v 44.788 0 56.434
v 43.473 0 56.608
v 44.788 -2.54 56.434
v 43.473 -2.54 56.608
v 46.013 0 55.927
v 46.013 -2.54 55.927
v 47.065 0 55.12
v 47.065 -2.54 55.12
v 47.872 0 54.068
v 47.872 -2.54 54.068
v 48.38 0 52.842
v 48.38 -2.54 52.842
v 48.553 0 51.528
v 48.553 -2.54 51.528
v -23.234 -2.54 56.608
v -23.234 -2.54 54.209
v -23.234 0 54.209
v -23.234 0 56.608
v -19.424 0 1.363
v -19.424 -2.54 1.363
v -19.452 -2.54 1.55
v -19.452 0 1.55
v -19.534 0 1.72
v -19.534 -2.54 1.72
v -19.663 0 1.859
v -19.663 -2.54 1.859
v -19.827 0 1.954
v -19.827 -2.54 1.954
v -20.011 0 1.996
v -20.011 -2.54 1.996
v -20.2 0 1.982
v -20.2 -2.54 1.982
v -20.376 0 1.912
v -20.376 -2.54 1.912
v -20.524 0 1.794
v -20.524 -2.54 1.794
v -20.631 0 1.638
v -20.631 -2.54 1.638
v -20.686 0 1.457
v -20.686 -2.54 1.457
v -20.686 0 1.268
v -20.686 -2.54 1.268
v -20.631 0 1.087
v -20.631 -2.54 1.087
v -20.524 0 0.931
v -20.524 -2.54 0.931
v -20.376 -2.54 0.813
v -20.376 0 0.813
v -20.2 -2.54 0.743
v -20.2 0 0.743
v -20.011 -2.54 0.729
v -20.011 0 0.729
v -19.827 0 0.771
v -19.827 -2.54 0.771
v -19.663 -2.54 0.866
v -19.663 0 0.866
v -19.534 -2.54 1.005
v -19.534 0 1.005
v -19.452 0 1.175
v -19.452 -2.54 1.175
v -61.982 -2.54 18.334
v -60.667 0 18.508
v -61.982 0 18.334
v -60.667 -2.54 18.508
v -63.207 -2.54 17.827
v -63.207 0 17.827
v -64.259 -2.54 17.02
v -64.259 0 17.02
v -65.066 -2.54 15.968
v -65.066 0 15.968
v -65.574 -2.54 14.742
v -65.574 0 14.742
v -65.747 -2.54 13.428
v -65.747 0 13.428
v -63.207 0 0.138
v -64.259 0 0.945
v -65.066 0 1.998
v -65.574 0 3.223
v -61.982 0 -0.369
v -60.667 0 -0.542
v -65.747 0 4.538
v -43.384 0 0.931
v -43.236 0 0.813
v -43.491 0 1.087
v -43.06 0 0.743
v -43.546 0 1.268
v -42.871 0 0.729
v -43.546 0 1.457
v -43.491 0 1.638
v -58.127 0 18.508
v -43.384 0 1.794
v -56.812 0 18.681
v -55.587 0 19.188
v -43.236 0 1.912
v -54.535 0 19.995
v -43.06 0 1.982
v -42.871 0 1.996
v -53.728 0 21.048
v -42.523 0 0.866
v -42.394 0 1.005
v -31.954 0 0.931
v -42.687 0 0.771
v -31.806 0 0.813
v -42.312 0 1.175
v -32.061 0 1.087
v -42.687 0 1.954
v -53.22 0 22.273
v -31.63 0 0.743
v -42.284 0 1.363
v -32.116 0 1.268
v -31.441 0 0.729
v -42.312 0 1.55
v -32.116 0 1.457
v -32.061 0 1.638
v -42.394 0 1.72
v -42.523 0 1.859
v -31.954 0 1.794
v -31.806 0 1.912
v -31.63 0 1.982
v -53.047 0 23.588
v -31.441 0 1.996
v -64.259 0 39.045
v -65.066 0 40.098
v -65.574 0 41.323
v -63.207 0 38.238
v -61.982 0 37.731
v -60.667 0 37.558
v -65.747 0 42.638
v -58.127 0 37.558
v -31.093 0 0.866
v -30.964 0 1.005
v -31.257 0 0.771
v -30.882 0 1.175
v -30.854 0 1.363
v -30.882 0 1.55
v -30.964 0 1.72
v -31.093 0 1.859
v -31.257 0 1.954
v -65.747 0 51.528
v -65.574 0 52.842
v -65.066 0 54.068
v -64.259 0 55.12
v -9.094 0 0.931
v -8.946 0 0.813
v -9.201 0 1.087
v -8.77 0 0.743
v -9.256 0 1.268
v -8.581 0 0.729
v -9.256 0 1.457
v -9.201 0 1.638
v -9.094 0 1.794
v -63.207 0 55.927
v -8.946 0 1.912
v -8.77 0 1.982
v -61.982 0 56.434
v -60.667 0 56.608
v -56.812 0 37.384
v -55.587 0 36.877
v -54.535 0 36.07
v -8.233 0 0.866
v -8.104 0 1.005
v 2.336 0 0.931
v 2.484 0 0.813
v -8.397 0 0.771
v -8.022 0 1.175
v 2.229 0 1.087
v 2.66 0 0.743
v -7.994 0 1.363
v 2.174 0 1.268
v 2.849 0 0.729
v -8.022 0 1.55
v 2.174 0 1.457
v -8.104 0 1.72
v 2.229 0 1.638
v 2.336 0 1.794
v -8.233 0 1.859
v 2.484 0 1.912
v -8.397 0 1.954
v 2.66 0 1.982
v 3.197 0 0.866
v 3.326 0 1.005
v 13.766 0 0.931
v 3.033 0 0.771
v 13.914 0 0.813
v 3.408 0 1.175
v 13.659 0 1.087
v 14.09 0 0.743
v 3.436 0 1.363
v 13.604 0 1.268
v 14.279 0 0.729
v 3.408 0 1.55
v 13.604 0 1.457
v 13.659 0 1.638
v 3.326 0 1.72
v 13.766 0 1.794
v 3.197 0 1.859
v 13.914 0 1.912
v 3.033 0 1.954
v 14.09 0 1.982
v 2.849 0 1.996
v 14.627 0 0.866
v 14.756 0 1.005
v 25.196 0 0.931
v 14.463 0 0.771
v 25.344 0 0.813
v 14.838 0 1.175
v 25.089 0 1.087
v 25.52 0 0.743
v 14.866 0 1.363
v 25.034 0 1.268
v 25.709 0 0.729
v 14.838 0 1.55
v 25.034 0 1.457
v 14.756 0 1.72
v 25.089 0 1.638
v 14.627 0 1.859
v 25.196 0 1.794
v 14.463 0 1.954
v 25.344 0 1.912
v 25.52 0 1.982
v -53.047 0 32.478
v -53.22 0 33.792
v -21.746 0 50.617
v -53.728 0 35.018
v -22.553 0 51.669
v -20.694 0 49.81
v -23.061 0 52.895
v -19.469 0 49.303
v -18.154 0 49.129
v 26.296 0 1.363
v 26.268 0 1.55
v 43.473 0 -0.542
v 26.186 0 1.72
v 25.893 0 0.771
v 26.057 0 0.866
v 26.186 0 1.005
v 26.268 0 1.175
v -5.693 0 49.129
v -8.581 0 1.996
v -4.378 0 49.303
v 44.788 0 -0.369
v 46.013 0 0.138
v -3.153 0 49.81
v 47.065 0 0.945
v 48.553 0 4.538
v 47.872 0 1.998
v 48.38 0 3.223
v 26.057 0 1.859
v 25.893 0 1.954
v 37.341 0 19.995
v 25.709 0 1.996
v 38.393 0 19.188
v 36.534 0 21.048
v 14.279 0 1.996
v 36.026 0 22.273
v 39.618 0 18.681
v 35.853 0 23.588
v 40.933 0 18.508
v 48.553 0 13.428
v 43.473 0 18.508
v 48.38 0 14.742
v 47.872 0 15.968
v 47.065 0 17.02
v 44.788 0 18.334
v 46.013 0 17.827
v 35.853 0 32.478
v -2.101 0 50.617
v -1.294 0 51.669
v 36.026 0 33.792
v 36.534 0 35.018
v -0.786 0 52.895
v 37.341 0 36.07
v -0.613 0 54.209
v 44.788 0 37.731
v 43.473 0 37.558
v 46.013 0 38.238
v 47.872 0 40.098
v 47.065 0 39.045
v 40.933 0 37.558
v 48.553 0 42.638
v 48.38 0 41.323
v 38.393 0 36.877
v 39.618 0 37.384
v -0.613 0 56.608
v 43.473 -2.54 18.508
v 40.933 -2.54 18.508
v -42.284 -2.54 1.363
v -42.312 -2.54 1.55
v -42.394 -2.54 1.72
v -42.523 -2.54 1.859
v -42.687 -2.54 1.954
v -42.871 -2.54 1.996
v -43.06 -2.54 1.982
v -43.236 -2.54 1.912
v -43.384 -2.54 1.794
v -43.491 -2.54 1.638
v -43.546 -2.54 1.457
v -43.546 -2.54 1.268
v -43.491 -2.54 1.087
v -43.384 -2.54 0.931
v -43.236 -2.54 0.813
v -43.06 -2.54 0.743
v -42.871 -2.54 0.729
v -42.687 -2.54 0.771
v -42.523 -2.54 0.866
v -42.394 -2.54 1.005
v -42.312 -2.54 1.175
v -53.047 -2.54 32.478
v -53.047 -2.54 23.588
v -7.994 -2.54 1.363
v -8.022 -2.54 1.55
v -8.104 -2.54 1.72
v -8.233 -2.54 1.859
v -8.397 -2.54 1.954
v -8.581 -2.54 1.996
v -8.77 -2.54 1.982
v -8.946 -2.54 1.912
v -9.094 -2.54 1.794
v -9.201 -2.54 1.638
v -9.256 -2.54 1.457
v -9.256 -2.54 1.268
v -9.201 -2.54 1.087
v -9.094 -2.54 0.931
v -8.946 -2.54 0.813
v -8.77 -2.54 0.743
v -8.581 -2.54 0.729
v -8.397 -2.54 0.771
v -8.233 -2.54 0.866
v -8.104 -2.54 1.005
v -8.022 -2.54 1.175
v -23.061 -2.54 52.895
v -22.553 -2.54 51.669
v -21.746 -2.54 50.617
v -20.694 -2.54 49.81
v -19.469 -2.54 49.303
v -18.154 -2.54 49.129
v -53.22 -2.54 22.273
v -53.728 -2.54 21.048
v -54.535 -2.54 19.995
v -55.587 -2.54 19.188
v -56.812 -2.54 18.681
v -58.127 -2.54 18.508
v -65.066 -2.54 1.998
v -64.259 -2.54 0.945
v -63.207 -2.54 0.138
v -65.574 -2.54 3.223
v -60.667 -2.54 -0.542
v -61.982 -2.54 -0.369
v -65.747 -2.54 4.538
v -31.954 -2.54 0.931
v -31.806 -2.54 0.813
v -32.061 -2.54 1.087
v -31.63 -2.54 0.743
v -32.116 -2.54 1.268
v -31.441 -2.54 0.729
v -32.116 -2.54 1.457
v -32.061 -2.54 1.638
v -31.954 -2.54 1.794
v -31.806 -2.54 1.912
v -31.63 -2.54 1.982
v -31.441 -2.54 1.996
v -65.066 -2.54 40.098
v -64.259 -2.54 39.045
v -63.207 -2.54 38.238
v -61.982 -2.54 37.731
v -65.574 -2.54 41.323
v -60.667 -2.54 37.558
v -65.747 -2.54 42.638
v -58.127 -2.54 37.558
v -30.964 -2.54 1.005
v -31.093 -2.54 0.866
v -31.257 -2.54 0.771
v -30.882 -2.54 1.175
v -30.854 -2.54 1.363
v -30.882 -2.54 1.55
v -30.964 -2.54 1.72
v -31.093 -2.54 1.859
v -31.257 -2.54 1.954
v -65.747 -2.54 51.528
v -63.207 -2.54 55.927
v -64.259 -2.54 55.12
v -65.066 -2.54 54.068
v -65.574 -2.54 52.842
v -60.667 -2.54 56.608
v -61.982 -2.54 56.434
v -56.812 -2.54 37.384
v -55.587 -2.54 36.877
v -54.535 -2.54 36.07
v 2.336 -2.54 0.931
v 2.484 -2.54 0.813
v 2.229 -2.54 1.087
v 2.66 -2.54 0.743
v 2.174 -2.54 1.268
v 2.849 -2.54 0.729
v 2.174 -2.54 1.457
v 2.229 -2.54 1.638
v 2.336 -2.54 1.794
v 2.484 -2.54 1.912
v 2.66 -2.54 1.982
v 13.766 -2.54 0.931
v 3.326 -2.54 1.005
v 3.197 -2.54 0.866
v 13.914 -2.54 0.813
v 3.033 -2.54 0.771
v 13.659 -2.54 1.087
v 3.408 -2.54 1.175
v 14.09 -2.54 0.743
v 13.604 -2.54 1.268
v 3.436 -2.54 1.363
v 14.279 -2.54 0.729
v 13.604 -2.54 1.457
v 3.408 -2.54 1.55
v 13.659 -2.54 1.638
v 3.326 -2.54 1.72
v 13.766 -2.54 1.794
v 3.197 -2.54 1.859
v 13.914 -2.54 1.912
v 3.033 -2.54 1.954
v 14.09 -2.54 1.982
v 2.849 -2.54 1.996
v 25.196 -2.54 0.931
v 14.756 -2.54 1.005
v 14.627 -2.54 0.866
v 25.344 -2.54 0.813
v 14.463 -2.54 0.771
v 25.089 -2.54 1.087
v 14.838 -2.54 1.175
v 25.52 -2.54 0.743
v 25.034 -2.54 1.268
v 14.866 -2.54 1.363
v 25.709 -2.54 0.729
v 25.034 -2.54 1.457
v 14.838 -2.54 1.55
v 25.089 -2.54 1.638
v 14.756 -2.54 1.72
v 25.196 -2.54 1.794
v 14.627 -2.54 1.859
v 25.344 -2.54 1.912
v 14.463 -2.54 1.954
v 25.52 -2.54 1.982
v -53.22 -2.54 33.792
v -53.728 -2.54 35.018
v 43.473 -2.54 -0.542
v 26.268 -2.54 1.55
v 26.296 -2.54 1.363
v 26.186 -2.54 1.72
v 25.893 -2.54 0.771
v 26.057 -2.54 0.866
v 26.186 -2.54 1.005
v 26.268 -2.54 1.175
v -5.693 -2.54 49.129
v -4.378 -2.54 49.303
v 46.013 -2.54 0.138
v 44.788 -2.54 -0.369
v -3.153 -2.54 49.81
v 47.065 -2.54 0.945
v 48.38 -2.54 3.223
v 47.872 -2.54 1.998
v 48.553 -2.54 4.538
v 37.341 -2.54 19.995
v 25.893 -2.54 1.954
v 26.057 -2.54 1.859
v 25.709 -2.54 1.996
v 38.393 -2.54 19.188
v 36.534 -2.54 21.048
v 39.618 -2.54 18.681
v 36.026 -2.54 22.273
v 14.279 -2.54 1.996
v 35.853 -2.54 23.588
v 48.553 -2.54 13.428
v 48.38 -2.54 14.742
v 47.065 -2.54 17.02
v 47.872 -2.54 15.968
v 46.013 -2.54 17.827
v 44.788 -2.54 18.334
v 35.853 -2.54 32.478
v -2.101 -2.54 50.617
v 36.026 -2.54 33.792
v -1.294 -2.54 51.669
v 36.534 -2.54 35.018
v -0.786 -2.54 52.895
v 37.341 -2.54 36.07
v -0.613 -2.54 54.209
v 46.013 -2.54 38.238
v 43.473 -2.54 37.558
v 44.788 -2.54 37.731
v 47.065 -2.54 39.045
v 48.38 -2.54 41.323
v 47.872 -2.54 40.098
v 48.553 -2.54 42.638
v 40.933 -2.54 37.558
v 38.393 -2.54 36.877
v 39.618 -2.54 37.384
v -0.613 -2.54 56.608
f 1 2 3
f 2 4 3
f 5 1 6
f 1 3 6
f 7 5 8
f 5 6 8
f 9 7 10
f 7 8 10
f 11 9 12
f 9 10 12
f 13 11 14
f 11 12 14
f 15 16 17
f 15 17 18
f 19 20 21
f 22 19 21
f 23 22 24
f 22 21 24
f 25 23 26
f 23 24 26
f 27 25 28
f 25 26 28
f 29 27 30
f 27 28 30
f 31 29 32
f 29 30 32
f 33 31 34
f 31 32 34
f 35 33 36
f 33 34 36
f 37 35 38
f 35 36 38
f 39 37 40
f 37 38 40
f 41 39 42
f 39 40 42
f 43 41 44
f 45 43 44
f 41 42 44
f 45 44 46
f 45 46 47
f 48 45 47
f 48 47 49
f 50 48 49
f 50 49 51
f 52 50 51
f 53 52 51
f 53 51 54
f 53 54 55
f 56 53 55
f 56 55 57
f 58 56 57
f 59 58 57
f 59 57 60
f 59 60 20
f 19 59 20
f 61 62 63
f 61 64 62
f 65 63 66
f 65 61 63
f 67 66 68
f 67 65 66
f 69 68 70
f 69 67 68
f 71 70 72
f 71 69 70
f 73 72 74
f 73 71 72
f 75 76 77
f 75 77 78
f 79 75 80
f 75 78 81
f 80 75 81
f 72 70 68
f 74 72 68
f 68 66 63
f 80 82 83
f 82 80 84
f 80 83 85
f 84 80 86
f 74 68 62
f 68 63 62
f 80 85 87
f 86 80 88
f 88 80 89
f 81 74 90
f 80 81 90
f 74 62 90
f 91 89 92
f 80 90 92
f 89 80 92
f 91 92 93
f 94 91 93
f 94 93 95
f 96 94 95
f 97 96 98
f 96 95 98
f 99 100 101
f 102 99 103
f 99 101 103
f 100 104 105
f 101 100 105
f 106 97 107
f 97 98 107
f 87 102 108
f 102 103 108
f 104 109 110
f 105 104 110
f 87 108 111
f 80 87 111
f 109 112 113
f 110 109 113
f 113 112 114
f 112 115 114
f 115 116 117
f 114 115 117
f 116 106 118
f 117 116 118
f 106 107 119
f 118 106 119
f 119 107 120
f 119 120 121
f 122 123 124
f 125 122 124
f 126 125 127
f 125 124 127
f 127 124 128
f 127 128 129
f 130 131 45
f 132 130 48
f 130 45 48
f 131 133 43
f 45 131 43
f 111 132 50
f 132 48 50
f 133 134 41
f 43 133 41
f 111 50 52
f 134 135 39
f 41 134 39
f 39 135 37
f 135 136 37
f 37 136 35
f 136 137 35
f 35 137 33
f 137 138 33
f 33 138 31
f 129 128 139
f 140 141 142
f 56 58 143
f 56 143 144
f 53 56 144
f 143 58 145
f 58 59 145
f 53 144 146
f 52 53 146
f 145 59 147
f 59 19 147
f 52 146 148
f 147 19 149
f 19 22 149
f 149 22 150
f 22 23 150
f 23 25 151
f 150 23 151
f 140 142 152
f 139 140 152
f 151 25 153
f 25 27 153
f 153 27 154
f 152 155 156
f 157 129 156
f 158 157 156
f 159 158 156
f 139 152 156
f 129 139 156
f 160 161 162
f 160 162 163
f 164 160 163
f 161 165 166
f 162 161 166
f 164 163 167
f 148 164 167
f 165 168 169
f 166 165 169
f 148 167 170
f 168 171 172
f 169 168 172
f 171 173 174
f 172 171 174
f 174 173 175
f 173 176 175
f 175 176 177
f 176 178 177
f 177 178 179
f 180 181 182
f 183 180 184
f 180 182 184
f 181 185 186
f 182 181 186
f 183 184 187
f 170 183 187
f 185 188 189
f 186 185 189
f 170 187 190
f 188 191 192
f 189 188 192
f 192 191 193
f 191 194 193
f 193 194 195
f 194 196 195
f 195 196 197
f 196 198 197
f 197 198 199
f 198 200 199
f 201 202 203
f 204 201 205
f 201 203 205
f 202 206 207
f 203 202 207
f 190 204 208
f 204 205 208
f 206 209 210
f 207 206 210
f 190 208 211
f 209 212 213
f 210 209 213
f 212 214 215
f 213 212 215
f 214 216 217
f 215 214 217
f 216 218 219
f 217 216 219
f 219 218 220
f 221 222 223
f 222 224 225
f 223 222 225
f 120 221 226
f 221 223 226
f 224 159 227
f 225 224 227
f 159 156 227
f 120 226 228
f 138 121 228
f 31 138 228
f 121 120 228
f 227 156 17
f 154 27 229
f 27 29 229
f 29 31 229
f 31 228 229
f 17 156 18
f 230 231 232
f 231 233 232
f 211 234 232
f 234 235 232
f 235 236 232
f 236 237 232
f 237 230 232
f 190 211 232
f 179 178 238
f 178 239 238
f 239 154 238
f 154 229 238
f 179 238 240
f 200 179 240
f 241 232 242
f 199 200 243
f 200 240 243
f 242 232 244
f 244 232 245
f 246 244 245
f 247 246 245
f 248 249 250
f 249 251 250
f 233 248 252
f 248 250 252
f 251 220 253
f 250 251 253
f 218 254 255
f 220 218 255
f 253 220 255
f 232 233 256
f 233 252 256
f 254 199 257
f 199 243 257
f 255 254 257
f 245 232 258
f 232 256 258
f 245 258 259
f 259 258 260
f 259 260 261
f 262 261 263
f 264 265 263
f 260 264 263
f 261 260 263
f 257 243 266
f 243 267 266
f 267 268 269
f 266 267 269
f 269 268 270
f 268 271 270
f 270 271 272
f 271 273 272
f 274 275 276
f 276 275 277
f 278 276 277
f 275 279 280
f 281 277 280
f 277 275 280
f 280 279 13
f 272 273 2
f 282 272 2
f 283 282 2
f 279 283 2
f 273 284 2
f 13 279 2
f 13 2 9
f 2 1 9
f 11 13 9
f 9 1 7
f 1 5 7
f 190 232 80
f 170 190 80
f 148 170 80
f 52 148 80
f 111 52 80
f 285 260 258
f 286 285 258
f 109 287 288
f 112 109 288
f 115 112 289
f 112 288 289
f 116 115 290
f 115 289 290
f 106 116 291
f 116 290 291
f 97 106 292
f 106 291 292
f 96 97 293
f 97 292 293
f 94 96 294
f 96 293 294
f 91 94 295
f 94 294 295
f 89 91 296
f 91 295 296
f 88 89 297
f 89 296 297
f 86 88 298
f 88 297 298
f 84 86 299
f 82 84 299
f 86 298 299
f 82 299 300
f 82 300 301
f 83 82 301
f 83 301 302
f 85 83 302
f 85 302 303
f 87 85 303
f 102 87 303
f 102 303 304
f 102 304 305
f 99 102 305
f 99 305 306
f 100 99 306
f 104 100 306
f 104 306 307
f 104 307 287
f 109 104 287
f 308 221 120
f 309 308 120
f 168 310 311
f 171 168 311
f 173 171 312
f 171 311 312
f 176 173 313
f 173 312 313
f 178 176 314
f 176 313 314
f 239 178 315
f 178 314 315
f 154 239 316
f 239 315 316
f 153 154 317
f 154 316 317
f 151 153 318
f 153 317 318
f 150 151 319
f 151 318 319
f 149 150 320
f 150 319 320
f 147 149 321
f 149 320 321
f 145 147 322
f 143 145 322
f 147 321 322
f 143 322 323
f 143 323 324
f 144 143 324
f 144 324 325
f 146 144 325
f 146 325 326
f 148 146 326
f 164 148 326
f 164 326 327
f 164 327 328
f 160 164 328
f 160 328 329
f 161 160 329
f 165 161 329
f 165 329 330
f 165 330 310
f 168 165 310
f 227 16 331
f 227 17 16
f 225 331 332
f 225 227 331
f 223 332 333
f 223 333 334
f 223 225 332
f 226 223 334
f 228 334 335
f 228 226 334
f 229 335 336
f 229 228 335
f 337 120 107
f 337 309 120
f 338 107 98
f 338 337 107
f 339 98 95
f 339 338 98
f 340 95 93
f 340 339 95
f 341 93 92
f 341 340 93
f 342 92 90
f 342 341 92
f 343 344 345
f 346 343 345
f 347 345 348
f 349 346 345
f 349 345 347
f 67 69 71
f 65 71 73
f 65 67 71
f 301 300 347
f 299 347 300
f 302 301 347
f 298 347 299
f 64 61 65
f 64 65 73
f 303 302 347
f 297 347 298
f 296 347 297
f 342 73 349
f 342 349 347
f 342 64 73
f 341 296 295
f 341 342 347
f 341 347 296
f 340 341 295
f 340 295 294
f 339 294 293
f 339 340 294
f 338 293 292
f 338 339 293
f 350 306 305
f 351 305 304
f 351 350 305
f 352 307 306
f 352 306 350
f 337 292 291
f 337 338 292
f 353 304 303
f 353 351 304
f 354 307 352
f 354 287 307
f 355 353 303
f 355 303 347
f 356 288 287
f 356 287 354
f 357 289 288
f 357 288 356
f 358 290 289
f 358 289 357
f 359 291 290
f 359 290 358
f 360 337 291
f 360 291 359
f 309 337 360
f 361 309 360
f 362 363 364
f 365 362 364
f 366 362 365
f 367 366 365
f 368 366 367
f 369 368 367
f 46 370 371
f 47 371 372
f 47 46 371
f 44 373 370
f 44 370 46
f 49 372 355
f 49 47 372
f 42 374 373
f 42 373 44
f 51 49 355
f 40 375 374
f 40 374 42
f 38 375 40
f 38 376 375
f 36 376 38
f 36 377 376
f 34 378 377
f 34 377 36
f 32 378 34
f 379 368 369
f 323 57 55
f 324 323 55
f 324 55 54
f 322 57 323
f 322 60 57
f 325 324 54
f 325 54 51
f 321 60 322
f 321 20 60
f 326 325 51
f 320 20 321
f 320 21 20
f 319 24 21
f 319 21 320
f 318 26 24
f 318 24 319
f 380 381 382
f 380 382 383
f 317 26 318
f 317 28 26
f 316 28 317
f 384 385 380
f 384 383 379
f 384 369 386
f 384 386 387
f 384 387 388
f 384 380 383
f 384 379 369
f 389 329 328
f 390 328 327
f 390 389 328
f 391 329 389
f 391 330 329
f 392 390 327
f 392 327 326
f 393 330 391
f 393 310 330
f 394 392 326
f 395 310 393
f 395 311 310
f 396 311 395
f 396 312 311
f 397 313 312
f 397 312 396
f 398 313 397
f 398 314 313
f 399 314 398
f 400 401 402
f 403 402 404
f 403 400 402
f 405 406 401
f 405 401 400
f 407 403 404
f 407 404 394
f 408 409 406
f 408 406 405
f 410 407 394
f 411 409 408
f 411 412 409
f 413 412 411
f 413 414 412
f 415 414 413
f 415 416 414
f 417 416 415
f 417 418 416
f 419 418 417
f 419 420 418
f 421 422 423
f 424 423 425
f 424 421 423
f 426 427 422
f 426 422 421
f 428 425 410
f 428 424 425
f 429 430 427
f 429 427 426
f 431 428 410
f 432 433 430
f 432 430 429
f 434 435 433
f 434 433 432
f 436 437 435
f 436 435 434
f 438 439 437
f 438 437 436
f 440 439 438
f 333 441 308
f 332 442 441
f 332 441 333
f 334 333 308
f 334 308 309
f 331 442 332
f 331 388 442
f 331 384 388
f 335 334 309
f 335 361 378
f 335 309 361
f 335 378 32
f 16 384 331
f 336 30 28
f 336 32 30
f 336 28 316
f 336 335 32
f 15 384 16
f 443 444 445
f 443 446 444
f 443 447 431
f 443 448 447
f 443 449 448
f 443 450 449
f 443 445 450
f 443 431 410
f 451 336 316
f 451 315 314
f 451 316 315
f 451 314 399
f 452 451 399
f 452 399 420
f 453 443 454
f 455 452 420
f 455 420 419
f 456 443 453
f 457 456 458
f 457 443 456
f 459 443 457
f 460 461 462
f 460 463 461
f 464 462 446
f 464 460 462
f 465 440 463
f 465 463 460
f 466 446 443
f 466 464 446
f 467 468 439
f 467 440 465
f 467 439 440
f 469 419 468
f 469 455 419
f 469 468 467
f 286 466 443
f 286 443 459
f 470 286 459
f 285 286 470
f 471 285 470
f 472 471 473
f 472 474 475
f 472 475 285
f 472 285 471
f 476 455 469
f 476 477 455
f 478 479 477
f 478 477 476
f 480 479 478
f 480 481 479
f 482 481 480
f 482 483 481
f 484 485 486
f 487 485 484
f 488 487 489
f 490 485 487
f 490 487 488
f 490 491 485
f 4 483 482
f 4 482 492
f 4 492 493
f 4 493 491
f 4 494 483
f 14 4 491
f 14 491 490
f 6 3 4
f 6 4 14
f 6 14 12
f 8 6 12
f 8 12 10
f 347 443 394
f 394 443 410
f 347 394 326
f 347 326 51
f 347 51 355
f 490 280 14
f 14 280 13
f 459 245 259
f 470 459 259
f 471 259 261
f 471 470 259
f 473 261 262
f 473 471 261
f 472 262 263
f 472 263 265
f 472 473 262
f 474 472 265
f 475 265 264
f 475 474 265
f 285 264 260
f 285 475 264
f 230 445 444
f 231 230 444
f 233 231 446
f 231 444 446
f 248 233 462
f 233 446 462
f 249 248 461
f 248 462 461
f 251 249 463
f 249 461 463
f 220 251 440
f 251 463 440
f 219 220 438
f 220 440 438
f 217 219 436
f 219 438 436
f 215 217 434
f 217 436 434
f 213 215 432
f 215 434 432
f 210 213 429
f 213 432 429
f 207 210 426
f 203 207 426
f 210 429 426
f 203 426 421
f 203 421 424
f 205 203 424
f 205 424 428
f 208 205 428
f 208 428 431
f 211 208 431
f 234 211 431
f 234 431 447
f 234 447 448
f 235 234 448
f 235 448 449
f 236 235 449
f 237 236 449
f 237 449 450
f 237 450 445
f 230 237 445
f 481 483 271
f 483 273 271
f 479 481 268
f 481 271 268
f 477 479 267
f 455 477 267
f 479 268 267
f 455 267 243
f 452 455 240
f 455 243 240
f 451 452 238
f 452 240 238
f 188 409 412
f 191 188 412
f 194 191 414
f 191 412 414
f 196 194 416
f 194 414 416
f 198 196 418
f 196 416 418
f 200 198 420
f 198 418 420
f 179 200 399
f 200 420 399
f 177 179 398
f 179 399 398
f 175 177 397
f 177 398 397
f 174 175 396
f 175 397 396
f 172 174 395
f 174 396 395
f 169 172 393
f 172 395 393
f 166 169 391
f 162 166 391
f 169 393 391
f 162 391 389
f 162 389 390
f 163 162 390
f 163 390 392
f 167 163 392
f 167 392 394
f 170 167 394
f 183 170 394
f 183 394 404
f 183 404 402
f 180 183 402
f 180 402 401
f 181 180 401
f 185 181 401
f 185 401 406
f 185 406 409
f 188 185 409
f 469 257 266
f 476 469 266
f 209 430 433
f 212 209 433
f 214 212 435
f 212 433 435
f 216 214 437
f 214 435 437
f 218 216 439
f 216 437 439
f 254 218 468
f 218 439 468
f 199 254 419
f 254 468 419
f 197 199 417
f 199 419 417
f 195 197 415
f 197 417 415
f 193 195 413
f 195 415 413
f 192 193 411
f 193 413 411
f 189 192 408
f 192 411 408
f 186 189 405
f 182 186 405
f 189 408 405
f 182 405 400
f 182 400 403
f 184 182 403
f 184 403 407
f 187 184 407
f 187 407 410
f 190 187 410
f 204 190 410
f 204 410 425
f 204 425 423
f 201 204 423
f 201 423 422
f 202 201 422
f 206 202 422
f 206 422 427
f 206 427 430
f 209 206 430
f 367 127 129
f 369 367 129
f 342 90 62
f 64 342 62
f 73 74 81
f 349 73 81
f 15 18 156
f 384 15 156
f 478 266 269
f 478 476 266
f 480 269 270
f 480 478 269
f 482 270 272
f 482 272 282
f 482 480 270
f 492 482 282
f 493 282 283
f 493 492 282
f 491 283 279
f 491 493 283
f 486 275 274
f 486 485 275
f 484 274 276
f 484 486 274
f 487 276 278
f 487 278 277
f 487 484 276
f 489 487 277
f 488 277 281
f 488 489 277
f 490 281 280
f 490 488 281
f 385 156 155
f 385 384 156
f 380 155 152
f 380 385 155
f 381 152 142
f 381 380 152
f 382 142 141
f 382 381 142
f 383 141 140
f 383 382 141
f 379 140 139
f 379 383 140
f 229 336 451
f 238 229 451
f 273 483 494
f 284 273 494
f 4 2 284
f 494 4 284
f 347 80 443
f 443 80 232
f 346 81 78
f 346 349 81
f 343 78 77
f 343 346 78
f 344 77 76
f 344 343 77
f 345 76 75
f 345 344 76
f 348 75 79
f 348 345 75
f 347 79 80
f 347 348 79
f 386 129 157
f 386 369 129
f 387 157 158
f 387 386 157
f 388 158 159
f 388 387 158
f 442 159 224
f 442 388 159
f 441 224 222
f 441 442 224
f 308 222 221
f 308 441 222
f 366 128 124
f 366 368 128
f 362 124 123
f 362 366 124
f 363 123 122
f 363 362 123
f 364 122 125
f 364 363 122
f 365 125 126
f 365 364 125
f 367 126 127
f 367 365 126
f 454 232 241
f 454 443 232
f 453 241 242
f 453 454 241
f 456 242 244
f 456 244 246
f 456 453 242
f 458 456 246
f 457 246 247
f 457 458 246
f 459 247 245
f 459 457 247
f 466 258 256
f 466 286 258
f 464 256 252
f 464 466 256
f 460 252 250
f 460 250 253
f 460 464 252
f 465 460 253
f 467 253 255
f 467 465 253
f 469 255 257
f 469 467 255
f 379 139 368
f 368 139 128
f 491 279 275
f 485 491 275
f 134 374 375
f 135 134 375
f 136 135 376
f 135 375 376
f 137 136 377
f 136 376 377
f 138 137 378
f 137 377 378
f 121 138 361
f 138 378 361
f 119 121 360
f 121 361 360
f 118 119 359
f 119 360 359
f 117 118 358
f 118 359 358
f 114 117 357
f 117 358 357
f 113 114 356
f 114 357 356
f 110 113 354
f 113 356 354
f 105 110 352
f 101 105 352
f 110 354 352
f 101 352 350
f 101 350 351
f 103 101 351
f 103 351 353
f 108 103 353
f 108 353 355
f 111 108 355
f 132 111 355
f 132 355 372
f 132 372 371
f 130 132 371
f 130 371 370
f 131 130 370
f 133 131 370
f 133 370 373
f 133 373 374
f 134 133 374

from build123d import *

# Parameters (mm, degrees)
F1_DEPTH = 2.54
F2_R     = 5.08
F3_R     = 0.635
F4_DEPTH = 25.4
F5_W     = 22.621028
F5_H     = 7.478164
F6_DEPTH = 25.4
F7_R     = 5.08


with BuildPart() as f1:
    # F0 (on Front) → F1 (new body)
    with BuildSketch(Plane.XZ):
        Polygon((48.55294, 56.607572), (-65.74706, 56.607572), (-65.74706, 37.557572), (-53.04706, 37.557572), (-53.04706, 18.507572), (-65.74706, 18.507572), (-65.74706, -0.542428), (48.55294, -0.542428), (48.55294, 18.507572), (35.85294, 18.507572), (35.85294, 37.557572), (48.55294, 37.557572), align=None)
    extrude(amount=F1_DEPTH)

    # F2
    f2_edges = [f1.edges().sort_by_distance(p)[0] for p in [
        (-65.74706, -1.27, 56.607572),
        (-65.74706, -1.27, 37.557572),
        (-53.04706, -1.27, 37.557572),
        (-53.04706, -1.27, 18.507572),
        (-65.74706, -1.27, 18.507572),
        (-65.74706, -1.27, -0.542428),
        (48.55294, -1.27, -0.542428),
        (35.85294, -1.27, 18.507572),
        (48.55294, -1.27, 18.507572),
        (35.85294, -1.27, 37.557572),
        (48.55294, -1.27, 37.557572),
        (48.55294, -1.27, 56.607572),
    ]]
    fillet(f2_edges, radius=F2_R)

    # F3 (on face) → F4 (cut)
    with BuildSketch(Plane.XZ.offset(2.54)):
        with Locations((-42.918559, 1.362572)):
            Circle(F3_R)
        with Locations((-31.488559, 1.362572)):
            Circle(F3_R)
        with Locations((-20.058559, 1.362572)):
            Circle(F3_R)
        with Locations((-8.628559, 1.362572)):
            Circle(F3_R)
        with Locations((2.801441, 1.362572)):
            Circle(F3_R)
        with Locations((14.231441, 1.362572)):
            Circle(F3_R)
        with Locations((25.661441, 1.362572)):
            Circle(F3_R)
    extrude(amount=-F4_DEPTH, mode=Mode.SUBTRACT)

    # F5 (on face) → F6 (cut)
    with BuildSketch(Plane.XZ.offset(2.54)):
        with Locations((-11.923544, 52.86849)):
            Rectangle(F5_W, F5_H)
    extrude(amount=-F6_DEPTH, mode=Mode.SUBTRACT)

    # F7
    f7_edges = [f1.edges().sort_by_distance(p)[0] for p in [
        (-23.234058, -1.27, 49.129408),
        (-0.61303, -1.27, 49.129408),
    ]]
    fillet(f7_edges, radius=F7_R)


solid = f1.part
